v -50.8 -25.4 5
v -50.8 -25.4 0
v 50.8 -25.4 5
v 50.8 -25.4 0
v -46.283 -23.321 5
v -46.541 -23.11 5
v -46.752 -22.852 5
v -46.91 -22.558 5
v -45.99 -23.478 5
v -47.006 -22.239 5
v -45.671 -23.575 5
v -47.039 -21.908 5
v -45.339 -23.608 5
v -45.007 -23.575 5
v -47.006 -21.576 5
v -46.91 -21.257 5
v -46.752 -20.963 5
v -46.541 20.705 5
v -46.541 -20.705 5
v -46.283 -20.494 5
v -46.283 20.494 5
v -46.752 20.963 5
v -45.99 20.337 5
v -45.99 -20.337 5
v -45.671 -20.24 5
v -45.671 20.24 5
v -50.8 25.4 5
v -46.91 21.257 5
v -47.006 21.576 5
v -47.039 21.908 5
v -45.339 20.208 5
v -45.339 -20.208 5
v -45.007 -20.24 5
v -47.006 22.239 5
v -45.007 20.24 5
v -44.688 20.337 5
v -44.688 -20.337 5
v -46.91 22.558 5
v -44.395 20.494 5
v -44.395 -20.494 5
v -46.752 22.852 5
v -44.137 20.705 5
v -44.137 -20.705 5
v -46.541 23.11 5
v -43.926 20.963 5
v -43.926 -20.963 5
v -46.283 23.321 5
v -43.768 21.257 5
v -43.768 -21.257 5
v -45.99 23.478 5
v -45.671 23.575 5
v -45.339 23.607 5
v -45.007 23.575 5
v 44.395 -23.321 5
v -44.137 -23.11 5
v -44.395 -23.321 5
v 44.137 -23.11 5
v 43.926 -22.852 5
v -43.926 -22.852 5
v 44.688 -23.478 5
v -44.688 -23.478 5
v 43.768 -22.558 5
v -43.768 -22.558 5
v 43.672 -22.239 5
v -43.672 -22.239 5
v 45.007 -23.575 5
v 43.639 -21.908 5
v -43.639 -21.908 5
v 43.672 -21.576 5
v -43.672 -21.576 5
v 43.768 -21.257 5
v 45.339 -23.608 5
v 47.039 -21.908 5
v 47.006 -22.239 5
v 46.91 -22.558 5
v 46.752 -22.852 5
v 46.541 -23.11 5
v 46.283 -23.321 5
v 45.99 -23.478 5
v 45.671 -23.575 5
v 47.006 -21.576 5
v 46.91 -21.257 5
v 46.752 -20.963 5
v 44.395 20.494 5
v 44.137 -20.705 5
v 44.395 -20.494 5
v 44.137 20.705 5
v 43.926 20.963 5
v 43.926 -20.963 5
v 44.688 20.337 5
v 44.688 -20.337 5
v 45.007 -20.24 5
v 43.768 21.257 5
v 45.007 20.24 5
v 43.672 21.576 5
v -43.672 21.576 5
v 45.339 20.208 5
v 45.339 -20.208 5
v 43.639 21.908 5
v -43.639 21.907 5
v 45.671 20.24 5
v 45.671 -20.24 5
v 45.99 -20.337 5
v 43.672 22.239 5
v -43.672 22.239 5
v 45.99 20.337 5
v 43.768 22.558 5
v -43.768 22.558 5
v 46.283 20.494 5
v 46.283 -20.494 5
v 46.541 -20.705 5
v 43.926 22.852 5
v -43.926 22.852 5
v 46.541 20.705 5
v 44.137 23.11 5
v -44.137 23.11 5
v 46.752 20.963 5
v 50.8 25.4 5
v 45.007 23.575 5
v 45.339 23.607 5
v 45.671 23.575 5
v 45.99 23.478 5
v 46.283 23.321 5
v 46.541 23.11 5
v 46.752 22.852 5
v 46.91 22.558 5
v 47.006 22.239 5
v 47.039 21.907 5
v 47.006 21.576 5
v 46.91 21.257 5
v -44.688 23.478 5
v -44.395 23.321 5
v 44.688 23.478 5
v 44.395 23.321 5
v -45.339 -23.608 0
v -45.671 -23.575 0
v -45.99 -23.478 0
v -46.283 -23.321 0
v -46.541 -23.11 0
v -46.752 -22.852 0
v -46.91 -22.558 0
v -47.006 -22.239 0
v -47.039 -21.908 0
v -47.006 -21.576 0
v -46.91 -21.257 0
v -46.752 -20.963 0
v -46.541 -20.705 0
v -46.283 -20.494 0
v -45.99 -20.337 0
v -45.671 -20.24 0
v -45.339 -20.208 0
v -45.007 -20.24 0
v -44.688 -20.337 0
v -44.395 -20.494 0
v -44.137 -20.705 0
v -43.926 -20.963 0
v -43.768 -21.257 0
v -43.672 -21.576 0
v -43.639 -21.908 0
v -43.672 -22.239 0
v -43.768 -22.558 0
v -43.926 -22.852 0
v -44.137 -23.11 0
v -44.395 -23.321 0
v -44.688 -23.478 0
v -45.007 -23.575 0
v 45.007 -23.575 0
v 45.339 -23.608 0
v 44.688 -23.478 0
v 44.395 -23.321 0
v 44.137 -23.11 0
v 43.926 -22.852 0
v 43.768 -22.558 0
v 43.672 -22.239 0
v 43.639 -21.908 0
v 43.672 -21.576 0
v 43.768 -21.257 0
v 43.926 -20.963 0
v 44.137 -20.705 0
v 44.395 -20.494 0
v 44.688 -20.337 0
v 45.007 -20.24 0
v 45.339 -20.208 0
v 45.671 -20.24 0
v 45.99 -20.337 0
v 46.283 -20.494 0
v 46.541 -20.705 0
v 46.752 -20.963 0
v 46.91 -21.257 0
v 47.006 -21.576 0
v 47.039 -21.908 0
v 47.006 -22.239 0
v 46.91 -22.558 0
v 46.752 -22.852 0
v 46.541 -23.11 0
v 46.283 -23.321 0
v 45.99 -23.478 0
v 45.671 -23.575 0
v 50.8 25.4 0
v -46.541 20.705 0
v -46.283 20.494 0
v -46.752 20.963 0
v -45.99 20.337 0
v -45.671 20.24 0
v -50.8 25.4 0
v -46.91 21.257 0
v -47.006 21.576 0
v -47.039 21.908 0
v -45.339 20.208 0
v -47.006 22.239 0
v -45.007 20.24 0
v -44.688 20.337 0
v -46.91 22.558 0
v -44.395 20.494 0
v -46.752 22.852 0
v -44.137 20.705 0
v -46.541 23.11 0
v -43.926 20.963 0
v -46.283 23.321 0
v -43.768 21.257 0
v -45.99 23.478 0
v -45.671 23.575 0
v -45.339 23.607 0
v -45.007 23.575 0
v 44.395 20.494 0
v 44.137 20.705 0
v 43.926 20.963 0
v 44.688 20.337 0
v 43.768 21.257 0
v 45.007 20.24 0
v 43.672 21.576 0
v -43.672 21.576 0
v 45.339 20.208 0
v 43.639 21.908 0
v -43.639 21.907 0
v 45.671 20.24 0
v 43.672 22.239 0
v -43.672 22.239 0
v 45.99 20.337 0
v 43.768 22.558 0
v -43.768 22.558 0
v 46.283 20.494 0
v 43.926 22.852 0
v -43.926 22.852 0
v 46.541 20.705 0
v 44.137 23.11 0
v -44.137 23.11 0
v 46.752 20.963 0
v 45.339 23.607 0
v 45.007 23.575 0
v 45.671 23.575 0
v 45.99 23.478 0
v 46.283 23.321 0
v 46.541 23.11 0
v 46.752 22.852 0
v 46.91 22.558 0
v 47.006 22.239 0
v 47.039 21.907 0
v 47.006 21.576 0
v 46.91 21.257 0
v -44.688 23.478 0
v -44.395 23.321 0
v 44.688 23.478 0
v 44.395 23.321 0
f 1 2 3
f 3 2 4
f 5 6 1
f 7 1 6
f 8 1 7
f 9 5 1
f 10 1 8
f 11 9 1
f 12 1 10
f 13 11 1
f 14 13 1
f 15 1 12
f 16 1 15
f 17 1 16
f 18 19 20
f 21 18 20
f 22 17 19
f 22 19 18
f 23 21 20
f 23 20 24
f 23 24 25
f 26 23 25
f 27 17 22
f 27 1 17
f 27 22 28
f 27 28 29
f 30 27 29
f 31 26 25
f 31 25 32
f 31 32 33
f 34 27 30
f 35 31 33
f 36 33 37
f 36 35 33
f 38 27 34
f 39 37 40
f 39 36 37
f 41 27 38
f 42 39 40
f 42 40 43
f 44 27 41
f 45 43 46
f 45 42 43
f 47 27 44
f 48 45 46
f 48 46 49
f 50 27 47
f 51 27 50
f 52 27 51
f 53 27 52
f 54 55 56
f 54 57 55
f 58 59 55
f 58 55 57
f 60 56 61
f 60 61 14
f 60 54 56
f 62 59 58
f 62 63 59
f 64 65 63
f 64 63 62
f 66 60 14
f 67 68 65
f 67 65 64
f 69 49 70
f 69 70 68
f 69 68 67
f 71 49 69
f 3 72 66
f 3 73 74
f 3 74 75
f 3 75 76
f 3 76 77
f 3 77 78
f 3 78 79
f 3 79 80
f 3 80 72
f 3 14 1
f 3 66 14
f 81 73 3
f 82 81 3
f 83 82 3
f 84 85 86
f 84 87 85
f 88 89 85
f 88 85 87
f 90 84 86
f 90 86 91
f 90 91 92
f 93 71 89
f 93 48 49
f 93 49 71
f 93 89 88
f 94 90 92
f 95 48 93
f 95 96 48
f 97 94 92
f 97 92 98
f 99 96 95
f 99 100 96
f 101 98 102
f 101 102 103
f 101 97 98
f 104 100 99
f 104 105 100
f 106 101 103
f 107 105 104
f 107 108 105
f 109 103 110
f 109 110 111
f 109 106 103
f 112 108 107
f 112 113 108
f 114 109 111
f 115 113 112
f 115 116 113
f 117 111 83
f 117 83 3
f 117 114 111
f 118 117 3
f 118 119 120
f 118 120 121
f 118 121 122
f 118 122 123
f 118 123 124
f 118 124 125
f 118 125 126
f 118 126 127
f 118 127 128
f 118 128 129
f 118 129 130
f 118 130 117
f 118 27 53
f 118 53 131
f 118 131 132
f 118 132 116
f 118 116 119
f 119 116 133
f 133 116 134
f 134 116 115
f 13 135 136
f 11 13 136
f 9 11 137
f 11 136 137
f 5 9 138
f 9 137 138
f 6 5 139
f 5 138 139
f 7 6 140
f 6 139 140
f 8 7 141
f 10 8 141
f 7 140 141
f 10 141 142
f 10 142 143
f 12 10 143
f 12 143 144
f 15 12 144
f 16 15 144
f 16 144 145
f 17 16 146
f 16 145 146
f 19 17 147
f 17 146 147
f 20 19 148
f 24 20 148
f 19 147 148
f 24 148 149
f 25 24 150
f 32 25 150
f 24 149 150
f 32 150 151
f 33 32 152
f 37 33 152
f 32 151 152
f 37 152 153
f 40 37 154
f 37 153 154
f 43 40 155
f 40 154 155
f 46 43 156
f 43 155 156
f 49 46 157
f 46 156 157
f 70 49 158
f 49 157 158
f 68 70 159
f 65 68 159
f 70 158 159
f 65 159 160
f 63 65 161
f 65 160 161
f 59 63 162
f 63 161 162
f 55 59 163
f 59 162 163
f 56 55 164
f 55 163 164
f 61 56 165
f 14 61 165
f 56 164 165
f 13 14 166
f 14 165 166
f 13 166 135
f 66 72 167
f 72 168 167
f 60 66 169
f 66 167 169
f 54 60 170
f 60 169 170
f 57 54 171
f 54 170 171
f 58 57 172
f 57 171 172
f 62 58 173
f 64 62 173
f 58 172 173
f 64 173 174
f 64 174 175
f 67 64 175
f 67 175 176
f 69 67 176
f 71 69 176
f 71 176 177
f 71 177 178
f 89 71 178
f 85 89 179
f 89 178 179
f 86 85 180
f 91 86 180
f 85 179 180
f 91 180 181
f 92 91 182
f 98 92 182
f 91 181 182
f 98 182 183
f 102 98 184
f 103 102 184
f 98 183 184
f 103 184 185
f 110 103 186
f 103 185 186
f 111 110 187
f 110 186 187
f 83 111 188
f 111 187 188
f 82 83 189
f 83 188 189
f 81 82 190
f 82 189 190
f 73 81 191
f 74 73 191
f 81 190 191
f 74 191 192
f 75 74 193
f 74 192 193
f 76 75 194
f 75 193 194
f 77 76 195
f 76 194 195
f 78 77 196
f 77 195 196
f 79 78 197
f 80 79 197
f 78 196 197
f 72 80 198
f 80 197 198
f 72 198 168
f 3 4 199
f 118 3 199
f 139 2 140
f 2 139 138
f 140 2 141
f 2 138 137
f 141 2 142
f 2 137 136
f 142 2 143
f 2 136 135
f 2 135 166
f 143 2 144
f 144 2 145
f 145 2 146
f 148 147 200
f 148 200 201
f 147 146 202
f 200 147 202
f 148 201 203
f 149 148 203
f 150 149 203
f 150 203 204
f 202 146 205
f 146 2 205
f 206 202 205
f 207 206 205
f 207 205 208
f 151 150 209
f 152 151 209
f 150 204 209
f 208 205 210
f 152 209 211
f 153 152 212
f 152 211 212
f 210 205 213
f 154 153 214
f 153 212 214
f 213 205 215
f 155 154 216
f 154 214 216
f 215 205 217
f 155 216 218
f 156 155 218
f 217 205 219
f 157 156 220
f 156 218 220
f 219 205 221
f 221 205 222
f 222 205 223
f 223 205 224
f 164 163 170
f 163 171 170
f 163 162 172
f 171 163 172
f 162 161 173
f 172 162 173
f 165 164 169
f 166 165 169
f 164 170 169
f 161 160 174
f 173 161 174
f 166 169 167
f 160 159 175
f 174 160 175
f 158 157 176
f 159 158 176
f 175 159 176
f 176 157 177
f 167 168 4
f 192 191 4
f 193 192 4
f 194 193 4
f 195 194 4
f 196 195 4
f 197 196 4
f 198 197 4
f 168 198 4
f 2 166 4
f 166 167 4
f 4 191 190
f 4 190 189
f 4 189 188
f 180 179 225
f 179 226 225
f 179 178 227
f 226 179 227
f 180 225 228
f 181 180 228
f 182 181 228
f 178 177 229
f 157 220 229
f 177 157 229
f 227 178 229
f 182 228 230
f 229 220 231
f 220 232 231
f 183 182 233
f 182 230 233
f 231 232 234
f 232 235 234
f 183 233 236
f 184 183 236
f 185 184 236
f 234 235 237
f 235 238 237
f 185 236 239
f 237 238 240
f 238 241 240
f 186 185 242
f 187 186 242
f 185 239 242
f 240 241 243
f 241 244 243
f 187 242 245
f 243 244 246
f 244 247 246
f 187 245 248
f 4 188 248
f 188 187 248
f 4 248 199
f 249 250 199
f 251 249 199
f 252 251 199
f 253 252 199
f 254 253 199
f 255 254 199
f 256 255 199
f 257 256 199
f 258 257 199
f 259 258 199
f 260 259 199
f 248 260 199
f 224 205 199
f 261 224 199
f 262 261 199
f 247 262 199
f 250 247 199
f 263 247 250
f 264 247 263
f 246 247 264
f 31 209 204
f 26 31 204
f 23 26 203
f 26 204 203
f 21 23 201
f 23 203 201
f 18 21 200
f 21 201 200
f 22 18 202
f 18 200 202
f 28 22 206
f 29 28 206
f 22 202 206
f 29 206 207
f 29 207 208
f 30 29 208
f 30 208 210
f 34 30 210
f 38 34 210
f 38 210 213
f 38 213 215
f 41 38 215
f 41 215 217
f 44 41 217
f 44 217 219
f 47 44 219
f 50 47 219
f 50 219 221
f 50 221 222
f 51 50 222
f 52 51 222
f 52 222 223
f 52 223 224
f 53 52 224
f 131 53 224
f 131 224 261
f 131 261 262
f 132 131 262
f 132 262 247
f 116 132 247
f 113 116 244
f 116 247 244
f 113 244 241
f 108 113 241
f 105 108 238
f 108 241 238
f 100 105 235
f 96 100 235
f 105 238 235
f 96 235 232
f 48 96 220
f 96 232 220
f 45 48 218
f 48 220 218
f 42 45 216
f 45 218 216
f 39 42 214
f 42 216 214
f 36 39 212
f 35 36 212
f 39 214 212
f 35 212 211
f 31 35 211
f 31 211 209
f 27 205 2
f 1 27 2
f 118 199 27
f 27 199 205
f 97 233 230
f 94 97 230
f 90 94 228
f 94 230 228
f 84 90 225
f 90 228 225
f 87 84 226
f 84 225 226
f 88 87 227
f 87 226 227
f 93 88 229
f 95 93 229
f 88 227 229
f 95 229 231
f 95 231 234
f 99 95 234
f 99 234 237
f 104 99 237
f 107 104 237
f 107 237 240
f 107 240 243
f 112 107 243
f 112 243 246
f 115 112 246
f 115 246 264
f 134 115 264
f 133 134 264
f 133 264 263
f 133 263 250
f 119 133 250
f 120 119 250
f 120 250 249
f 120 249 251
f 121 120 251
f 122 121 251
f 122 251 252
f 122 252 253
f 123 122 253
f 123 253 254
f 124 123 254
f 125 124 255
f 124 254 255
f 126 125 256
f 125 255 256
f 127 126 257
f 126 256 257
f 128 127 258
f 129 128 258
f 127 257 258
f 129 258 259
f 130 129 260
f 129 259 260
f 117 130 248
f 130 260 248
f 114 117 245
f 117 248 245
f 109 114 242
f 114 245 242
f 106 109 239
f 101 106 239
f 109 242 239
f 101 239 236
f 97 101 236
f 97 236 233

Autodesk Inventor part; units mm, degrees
ref_plane "YZ Plane" through (0, 0, 0) normal (1, 0, 0) x (0, 1, 0)
ref_plane "XZ Plane" through (0, 0, 0) normal (0, 1, 0) x (-1, 0, 0)
ref_plane "XY Plane" through (0, 0, 0) normal (0, 0, 1) x (1, 0, 0)
sketch "Sketch1" plane through (0, 0, 0) normal (0, 0, 1) x (1, 0, 0)
  line L0 (-50.8, -25.4) -> (50.8, -25.4)
  line L1 (50.8, -25.4) -> (50.8, 25.4)
  line L2 (50.8, 25.4) -> (-50.8, 25.4)
  line L3 (-50.8, 25.4) -> (-50.8, -25.4)
  point P0 (0, 0)
  point P1 (0, 25.4)
  point P2 (50.8, 0)
  dimension "d12" = 90
  dimension "d0" = 50.8
  dimension "d2" = 101.6
extrude "Extrusion1" add sketch "Sketch1" along normal blind 5
sketch "Sketch2" plane through (0, 0, 5) normal (0, 0, 1) x (1, 0, 0)
  line L0 (50.8, -25.4) -> (50.8, 25.4) projected
  line L1 (50.8, 25.4) -> (-50.8, 25.4) projected
  line L2 (-45.339, 21.9075) -> (45.339, 21.9075)
  line L3 (45.339, 21.9075) -> (45.339, -21.9075)
  line L4 (45.339, -21.9075) -> (-45.339, -21.9075)
  line L5 (-45.339, -21.9075) -> (-45.339, 21.9075)
  point P0 (45.339, 0)
  point P1 (50.8, 0)
  point P2 (0, 21.9075)
  point P3 (0, 25.4)
  dimension "d5" = 43.815
  dimension "d7" = 90.678
hole "Hole1" at (-45.339, 21.9075, 5) at (45.339, 21.9075, 5) at (45.339, -21.9075, 5) at (-45.339, -21.9075, 5) direction (0, 0, -1) diameter 3.4 end through all clearance for "Socket Head Cap Screw" size "M3" standard "Ansi Metric M Profile"
properties part number "electronics"
